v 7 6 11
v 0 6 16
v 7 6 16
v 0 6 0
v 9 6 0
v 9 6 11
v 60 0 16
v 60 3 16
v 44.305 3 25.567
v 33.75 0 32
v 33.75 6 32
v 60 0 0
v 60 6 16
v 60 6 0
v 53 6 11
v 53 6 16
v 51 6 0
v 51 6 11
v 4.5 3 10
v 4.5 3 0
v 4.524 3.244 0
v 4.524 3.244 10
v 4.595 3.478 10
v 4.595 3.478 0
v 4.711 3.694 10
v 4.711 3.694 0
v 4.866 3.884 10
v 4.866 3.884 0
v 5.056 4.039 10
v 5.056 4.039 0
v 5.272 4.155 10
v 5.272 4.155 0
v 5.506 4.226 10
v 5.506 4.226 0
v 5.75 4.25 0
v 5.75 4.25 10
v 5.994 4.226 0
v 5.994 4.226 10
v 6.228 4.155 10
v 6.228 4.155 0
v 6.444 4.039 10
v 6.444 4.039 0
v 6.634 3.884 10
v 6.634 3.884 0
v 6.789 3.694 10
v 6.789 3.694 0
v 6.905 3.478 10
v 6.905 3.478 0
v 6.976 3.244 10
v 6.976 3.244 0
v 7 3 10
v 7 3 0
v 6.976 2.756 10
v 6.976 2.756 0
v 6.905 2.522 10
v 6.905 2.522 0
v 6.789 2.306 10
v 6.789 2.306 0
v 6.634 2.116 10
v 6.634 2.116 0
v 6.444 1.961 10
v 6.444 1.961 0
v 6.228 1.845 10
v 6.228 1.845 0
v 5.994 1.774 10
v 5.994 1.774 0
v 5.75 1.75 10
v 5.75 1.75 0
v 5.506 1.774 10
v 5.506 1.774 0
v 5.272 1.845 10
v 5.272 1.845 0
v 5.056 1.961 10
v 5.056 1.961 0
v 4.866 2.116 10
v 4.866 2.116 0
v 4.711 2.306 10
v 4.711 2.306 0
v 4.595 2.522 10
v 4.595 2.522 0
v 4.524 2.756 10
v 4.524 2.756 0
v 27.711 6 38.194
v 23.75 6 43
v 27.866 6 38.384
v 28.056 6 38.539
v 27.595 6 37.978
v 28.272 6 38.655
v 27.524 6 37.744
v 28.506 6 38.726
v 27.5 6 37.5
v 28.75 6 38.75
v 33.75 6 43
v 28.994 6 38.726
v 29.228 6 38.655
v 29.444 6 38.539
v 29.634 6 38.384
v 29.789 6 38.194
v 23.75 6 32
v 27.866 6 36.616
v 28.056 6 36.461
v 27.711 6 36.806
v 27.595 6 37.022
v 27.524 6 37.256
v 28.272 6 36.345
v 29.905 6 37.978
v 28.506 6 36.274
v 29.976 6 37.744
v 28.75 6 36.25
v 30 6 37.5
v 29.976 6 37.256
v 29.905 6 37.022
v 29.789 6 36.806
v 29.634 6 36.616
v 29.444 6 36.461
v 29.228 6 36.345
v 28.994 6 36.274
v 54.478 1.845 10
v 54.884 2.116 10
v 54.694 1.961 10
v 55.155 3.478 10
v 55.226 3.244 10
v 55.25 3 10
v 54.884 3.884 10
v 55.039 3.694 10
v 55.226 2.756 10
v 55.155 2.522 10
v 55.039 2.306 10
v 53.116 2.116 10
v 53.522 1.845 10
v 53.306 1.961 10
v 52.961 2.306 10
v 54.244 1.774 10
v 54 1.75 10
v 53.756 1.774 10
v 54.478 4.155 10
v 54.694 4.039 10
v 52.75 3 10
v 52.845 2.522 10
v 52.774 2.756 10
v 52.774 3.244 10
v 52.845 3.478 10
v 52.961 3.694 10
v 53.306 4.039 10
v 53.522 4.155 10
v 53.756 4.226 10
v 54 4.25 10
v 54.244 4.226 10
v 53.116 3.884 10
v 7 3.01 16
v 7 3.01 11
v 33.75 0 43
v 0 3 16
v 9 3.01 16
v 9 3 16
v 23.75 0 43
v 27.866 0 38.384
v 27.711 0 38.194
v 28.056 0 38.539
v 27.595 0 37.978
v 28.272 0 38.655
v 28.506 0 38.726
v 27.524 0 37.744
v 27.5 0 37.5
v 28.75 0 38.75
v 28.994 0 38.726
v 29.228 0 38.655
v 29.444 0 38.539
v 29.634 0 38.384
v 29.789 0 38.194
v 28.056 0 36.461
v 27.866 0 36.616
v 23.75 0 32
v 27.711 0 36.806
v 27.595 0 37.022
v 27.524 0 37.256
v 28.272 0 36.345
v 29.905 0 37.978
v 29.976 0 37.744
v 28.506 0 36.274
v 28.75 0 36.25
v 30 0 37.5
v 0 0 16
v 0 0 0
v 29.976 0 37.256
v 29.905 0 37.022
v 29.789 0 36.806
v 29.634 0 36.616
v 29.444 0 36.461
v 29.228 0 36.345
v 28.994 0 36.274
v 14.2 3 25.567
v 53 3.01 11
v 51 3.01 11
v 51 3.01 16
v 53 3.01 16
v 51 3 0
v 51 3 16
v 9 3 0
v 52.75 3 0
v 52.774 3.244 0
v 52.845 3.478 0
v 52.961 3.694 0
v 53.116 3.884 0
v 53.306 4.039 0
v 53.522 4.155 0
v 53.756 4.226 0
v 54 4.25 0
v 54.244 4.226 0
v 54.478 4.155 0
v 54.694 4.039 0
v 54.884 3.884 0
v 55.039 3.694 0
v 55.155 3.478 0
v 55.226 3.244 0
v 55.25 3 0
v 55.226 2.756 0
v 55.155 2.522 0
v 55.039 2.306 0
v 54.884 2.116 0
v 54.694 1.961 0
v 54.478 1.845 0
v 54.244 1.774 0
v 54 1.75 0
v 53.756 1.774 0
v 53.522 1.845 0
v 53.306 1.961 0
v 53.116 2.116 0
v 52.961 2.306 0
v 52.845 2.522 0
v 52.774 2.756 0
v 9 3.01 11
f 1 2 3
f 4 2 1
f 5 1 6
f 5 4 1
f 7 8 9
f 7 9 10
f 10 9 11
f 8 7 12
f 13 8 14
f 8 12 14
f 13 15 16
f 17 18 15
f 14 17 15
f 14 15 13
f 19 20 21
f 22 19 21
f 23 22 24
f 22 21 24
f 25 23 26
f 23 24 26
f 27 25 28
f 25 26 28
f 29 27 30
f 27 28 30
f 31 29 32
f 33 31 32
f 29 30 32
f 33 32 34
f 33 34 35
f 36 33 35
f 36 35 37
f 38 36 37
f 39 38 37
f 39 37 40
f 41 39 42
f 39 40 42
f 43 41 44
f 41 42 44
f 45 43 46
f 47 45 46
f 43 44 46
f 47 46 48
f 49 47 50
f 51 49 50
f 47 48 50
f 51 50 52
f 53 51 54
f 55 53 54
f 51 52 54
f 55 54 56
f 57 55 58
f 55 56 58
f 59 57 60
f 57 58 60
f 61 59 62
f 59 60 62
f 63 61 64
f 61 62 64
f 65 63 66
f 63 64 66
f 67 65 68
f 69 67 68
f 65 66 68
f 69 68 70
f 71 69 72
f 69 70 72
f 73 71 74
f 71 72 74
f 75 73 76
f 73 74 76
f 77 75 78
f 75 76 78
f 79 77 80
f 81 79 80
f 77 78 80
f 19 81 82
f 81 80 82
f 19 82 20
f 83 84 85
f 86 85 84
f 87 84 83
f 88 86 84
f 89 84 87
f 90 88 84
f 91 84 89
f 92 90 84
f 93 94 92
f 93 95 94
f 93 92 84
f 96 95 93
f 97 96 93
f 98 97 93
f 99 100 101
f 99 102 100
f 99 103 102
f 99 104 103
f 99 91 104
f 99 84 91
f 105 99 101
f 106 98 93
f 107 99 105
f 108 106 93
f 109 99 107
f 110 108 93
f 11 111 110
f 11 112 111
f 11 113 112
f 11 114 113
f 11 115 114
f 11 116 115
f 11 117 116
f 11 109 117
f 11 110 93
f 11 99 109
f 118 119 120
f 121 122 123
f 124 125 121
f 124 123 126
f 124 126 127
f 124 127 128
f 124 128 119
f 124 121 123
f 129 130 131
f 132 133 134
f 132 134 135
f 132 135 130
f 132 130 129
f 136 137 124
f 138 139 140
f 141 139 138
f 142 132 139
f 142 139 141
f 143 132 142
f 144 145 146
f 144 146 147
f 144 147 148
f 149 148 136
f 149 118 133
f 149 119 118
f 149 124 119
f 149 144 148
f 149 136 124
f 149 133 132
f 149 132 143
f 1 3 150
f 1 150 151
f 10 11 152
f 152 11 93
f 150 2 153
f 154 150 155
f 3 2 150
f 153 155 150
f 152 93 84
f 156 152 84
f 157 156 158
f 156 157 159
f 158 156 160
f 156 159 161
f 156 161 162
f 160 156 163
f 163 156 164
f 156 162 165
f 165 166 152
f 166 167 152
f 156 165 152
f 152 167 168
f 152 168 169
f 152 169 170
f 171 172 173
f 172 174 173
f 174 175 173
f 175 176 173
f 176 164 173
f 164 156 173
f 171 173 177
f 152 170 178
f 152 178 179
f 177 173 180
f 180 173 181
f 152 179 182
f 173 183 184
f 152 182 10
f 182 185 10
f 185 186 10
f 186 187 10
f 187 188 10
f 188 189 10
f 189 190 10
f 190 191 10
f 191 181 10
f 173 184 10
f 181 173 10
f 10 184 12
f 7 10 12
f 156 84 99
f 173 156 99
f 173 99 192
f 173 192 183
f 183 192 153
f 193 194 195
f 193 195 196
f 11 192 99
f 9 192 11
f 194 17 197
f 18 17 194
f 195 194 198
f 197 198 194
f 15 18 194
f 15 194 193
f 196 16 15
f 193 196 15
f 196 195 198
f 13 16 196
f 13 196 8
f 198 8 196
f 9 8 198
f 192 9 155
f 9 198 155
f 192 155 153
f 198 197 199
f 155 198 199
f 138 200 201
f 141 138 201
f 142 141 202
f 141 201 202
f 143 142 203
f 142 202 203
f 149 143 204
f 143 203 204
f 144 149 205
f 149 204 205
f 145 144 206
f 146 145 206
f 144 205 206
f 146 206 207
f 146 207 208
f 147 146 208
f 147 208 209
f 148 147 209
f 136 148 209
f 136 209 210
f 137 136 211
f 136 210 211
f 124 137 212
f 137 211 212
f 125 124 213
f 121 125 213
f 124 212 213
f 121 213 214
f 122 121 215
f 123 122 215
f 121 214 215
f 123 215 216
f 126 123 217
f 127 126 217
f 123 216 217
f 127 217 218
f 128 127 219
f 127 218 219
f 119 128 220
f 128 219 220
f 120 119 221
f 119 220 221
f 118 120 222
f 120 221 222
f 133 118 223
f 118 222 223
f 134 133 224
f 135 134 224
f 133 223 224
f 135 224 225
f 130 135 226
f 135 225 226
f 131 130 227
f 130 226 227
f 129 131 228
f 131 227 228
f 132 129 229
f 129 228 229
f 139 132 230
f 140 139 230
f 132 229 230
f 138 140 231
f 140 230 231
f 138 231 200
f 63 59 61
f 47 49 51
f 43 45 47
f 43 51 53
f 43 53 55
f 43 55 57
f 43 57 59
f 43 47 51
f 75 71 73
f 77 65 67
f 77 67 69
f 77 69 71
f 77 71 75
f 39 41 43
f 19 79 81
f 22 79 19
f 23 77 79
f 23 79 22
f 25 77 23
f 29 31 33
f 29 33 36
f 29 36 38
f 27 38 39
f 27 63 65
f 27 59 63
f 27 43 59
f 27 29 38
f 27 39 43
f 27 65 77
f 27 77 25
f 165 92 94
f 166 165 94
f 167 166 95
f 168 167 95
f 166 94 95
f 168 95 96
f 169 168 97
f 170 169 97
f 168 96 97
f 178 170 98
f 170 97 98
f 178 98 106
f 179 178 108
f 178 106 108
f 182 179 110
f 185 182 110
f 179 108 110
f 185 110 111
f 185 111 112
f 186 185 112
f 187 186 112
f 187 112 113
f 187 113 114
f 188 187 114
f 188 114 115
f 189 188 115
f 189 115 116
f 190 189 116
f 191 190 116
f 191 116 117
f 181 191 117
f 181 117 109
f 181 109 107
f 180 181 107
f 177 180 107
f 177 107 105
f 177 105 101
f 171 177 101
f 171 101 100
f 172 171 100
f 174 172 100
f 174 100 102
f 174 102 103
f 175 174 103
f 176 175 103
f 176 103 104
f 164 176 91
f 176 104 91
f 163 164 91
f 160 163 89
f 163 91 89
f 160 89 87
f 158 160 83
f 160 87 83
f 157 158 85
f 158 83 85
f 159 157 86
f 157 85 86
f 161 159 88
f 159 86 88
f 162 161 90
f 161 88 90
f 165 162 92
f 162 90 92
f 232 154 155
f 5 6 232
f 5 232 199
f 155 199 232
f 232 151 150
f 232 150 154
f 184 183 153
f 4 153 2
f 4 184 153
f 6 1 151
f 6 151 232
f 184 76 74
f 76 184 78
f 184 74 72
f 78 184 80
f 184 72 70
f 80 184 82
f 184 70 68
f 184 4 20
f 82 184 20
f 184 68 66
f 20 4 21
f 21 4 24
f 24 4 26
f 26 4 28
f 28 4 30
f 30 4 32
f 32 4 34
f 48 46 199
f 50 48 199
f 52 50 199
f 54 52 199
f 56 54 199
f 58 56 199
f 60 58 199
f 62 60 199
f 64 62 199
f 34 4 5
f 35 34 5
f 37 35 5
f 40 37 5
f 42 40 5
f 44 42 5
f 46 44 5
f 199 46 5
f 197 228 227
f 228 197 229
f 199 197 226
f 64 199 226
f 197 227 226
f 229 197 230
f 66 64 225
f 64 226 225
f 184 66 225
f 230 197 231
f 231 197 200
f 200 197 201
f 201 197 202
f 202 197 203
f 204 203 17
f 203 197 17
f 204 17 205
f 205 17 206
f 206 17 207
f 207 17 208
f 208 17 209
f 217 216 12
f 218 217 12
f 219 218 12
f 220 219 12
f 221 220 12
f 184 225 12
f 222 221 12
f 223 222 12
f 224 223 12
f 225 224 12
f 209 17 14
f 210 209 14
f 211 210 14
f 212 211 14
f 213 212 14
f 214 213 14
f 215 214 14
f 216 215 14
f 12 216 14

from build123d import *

# Parameters (mm, degrees)
ESQUISSE1_W              = 60
ESQUISSE1_H              = 6
BOSS_EXTRU_1_DEPTH       = 60
ESQUISSE2_R              = 1.25
ENL_V_MAT_EXTRU_1_DEPTH  = 10
ESQUISSE3_R              = 1.25
ENL_V_MAT_EXTRU_2_DEPTH  = 15
ESQUISSE4_W              = 10
ESQUISSE4_H              = 11
ENL_V_MAT_EXTRU_3_DEPTH  = 3
ENL_V_MAT_EXTRU_4_DEPTH  = 52
CHANFREIN1_SIZE2         = 6.433520762
CHANFREIN1_SIZE          = 3
ESQUISSE6_W              = 2
ESQUISSE6_H              = 5
ENL_V_MAT_EXTRU_16_DEPTH = 2.99


with BuildPart() as part:
    # Esquisse1 → Boss.-Extru.1 (new body)
    with BuildSketch(Plane.XY):
        with Locations((30, 3)):
            Rectangle(ESQUISSE1_W, ESQUISSE1_H)
    extrude(amount=BOSS_EXTRU_1_DEPTH)

    # Esquisse2 → Enlèv. mat.-Extru.1 (cut)
    with BuildSketch(Plane(origin=(0, 0, 0), x_dir=(-1, 0, 0), z_dir=(0, 0, -1))):
        with Locations((-54, 3)):
            Circle(ESQUISSE2_R)
        with Locations((-5.75, 3)):
            Circle(ESQUISSE2_R)
    extrude(amount=-ENL_V_MAT_EXTRU_1_DEPTH, mode=Mode.SUBTRACT)

    # Esquisse3 → Enlèv. mat.-Extru.2 (cut)
    with BuildSketch(Plane(origin=(0, 6, 0), x_dir=(1, 0, 0), z_dir=(0, 1, 0))):
        with Locations(Location((28.75, -37.5, 0), (0, 0, 270))):
            Circle(ESQUISSE3_R)
    extrude(amount=-ENL_V_MAT_EXTRU_2_DEPTH, mode=Mode.SUBTRACT)

    # Esquisse4 → Enlèv. mat.-Extru.3 (cut)
    with BuildSketch(Plane(origin=(0, 6, 0), x_dir=(1, 0, 0), z_dir=(0, 1, 0))):
        Polygon((0, -16), (9, -16), (9, 0), (51, 0), (51, -16), (60, -16), (60, -60), (0, -60), align=None)
        with Locations((28.75, -37.5)):
            Rectangle(ESQUISSE4_W, ESQUISSE4_H, mode=Mode.SUBTRACT)
    extrude(amount=-ENL_V_MAT_EXTRU_3_DEPTH, mode=Mode.SUBTRACT)

    # Esquisse5 → Enlèv. mat.-Extru.4 (cut)
    with BuildSketch(Plane(origin=(0, 3, 0), x_dir=(1, 0, 0), z_dir=(0, 1, 0))):
        Polygon((60, -16), (33.75, -32), (33.75, -43), (23.75, -43), (23.75, -32), (0, -16), (-21.594855386, -85.475485762), (75.414479662, -69.930764824), align=None)
    extrude(amount=-ENL_V_MAT_EXTRU_4_DEPTH, mode=Mode.SUBTRACT)

    # Chanfrein1
    chanfrein1_edges = [part.edges().sort_by_distance(p)[0] for p in [
        (28.75, 3, 32),
    ]]
    chanfrein1_side = [part.faces().sort_by_distance(p)[0] for p in [
        (28.75, 3.06, 32),
    ]]
    chamfer(chanfrein1_edges, length=CHANFREIN1_SIZE - 0.0001, length2=CHANFREIN1_SIZE2 - 0.0001, reference=chanfrein1_side[0])  # a hair under: the kernel refuses the full size

    # Esquisse6 → Enlèv. mat.-Extru.16 (cut)
    with BuildSketch(Plane(origin=(0, 6, 0), x_dir=(1, 0, 0), z_dir=(0, 1, 0))):
        with Locations((52, -13.5)):
            Rectangle(ESQUISSE6_W, ESQUISSE6_H)
        with Locations((8, -13.5)):
            Rectangle(ESQUISSE6_W, ESQUISSE6_H)
    extrude(amount=-ENL_V_MAT_EXTRU_16_DEPTH, mode=Mode.SUBTRACT)


solid = part.part
